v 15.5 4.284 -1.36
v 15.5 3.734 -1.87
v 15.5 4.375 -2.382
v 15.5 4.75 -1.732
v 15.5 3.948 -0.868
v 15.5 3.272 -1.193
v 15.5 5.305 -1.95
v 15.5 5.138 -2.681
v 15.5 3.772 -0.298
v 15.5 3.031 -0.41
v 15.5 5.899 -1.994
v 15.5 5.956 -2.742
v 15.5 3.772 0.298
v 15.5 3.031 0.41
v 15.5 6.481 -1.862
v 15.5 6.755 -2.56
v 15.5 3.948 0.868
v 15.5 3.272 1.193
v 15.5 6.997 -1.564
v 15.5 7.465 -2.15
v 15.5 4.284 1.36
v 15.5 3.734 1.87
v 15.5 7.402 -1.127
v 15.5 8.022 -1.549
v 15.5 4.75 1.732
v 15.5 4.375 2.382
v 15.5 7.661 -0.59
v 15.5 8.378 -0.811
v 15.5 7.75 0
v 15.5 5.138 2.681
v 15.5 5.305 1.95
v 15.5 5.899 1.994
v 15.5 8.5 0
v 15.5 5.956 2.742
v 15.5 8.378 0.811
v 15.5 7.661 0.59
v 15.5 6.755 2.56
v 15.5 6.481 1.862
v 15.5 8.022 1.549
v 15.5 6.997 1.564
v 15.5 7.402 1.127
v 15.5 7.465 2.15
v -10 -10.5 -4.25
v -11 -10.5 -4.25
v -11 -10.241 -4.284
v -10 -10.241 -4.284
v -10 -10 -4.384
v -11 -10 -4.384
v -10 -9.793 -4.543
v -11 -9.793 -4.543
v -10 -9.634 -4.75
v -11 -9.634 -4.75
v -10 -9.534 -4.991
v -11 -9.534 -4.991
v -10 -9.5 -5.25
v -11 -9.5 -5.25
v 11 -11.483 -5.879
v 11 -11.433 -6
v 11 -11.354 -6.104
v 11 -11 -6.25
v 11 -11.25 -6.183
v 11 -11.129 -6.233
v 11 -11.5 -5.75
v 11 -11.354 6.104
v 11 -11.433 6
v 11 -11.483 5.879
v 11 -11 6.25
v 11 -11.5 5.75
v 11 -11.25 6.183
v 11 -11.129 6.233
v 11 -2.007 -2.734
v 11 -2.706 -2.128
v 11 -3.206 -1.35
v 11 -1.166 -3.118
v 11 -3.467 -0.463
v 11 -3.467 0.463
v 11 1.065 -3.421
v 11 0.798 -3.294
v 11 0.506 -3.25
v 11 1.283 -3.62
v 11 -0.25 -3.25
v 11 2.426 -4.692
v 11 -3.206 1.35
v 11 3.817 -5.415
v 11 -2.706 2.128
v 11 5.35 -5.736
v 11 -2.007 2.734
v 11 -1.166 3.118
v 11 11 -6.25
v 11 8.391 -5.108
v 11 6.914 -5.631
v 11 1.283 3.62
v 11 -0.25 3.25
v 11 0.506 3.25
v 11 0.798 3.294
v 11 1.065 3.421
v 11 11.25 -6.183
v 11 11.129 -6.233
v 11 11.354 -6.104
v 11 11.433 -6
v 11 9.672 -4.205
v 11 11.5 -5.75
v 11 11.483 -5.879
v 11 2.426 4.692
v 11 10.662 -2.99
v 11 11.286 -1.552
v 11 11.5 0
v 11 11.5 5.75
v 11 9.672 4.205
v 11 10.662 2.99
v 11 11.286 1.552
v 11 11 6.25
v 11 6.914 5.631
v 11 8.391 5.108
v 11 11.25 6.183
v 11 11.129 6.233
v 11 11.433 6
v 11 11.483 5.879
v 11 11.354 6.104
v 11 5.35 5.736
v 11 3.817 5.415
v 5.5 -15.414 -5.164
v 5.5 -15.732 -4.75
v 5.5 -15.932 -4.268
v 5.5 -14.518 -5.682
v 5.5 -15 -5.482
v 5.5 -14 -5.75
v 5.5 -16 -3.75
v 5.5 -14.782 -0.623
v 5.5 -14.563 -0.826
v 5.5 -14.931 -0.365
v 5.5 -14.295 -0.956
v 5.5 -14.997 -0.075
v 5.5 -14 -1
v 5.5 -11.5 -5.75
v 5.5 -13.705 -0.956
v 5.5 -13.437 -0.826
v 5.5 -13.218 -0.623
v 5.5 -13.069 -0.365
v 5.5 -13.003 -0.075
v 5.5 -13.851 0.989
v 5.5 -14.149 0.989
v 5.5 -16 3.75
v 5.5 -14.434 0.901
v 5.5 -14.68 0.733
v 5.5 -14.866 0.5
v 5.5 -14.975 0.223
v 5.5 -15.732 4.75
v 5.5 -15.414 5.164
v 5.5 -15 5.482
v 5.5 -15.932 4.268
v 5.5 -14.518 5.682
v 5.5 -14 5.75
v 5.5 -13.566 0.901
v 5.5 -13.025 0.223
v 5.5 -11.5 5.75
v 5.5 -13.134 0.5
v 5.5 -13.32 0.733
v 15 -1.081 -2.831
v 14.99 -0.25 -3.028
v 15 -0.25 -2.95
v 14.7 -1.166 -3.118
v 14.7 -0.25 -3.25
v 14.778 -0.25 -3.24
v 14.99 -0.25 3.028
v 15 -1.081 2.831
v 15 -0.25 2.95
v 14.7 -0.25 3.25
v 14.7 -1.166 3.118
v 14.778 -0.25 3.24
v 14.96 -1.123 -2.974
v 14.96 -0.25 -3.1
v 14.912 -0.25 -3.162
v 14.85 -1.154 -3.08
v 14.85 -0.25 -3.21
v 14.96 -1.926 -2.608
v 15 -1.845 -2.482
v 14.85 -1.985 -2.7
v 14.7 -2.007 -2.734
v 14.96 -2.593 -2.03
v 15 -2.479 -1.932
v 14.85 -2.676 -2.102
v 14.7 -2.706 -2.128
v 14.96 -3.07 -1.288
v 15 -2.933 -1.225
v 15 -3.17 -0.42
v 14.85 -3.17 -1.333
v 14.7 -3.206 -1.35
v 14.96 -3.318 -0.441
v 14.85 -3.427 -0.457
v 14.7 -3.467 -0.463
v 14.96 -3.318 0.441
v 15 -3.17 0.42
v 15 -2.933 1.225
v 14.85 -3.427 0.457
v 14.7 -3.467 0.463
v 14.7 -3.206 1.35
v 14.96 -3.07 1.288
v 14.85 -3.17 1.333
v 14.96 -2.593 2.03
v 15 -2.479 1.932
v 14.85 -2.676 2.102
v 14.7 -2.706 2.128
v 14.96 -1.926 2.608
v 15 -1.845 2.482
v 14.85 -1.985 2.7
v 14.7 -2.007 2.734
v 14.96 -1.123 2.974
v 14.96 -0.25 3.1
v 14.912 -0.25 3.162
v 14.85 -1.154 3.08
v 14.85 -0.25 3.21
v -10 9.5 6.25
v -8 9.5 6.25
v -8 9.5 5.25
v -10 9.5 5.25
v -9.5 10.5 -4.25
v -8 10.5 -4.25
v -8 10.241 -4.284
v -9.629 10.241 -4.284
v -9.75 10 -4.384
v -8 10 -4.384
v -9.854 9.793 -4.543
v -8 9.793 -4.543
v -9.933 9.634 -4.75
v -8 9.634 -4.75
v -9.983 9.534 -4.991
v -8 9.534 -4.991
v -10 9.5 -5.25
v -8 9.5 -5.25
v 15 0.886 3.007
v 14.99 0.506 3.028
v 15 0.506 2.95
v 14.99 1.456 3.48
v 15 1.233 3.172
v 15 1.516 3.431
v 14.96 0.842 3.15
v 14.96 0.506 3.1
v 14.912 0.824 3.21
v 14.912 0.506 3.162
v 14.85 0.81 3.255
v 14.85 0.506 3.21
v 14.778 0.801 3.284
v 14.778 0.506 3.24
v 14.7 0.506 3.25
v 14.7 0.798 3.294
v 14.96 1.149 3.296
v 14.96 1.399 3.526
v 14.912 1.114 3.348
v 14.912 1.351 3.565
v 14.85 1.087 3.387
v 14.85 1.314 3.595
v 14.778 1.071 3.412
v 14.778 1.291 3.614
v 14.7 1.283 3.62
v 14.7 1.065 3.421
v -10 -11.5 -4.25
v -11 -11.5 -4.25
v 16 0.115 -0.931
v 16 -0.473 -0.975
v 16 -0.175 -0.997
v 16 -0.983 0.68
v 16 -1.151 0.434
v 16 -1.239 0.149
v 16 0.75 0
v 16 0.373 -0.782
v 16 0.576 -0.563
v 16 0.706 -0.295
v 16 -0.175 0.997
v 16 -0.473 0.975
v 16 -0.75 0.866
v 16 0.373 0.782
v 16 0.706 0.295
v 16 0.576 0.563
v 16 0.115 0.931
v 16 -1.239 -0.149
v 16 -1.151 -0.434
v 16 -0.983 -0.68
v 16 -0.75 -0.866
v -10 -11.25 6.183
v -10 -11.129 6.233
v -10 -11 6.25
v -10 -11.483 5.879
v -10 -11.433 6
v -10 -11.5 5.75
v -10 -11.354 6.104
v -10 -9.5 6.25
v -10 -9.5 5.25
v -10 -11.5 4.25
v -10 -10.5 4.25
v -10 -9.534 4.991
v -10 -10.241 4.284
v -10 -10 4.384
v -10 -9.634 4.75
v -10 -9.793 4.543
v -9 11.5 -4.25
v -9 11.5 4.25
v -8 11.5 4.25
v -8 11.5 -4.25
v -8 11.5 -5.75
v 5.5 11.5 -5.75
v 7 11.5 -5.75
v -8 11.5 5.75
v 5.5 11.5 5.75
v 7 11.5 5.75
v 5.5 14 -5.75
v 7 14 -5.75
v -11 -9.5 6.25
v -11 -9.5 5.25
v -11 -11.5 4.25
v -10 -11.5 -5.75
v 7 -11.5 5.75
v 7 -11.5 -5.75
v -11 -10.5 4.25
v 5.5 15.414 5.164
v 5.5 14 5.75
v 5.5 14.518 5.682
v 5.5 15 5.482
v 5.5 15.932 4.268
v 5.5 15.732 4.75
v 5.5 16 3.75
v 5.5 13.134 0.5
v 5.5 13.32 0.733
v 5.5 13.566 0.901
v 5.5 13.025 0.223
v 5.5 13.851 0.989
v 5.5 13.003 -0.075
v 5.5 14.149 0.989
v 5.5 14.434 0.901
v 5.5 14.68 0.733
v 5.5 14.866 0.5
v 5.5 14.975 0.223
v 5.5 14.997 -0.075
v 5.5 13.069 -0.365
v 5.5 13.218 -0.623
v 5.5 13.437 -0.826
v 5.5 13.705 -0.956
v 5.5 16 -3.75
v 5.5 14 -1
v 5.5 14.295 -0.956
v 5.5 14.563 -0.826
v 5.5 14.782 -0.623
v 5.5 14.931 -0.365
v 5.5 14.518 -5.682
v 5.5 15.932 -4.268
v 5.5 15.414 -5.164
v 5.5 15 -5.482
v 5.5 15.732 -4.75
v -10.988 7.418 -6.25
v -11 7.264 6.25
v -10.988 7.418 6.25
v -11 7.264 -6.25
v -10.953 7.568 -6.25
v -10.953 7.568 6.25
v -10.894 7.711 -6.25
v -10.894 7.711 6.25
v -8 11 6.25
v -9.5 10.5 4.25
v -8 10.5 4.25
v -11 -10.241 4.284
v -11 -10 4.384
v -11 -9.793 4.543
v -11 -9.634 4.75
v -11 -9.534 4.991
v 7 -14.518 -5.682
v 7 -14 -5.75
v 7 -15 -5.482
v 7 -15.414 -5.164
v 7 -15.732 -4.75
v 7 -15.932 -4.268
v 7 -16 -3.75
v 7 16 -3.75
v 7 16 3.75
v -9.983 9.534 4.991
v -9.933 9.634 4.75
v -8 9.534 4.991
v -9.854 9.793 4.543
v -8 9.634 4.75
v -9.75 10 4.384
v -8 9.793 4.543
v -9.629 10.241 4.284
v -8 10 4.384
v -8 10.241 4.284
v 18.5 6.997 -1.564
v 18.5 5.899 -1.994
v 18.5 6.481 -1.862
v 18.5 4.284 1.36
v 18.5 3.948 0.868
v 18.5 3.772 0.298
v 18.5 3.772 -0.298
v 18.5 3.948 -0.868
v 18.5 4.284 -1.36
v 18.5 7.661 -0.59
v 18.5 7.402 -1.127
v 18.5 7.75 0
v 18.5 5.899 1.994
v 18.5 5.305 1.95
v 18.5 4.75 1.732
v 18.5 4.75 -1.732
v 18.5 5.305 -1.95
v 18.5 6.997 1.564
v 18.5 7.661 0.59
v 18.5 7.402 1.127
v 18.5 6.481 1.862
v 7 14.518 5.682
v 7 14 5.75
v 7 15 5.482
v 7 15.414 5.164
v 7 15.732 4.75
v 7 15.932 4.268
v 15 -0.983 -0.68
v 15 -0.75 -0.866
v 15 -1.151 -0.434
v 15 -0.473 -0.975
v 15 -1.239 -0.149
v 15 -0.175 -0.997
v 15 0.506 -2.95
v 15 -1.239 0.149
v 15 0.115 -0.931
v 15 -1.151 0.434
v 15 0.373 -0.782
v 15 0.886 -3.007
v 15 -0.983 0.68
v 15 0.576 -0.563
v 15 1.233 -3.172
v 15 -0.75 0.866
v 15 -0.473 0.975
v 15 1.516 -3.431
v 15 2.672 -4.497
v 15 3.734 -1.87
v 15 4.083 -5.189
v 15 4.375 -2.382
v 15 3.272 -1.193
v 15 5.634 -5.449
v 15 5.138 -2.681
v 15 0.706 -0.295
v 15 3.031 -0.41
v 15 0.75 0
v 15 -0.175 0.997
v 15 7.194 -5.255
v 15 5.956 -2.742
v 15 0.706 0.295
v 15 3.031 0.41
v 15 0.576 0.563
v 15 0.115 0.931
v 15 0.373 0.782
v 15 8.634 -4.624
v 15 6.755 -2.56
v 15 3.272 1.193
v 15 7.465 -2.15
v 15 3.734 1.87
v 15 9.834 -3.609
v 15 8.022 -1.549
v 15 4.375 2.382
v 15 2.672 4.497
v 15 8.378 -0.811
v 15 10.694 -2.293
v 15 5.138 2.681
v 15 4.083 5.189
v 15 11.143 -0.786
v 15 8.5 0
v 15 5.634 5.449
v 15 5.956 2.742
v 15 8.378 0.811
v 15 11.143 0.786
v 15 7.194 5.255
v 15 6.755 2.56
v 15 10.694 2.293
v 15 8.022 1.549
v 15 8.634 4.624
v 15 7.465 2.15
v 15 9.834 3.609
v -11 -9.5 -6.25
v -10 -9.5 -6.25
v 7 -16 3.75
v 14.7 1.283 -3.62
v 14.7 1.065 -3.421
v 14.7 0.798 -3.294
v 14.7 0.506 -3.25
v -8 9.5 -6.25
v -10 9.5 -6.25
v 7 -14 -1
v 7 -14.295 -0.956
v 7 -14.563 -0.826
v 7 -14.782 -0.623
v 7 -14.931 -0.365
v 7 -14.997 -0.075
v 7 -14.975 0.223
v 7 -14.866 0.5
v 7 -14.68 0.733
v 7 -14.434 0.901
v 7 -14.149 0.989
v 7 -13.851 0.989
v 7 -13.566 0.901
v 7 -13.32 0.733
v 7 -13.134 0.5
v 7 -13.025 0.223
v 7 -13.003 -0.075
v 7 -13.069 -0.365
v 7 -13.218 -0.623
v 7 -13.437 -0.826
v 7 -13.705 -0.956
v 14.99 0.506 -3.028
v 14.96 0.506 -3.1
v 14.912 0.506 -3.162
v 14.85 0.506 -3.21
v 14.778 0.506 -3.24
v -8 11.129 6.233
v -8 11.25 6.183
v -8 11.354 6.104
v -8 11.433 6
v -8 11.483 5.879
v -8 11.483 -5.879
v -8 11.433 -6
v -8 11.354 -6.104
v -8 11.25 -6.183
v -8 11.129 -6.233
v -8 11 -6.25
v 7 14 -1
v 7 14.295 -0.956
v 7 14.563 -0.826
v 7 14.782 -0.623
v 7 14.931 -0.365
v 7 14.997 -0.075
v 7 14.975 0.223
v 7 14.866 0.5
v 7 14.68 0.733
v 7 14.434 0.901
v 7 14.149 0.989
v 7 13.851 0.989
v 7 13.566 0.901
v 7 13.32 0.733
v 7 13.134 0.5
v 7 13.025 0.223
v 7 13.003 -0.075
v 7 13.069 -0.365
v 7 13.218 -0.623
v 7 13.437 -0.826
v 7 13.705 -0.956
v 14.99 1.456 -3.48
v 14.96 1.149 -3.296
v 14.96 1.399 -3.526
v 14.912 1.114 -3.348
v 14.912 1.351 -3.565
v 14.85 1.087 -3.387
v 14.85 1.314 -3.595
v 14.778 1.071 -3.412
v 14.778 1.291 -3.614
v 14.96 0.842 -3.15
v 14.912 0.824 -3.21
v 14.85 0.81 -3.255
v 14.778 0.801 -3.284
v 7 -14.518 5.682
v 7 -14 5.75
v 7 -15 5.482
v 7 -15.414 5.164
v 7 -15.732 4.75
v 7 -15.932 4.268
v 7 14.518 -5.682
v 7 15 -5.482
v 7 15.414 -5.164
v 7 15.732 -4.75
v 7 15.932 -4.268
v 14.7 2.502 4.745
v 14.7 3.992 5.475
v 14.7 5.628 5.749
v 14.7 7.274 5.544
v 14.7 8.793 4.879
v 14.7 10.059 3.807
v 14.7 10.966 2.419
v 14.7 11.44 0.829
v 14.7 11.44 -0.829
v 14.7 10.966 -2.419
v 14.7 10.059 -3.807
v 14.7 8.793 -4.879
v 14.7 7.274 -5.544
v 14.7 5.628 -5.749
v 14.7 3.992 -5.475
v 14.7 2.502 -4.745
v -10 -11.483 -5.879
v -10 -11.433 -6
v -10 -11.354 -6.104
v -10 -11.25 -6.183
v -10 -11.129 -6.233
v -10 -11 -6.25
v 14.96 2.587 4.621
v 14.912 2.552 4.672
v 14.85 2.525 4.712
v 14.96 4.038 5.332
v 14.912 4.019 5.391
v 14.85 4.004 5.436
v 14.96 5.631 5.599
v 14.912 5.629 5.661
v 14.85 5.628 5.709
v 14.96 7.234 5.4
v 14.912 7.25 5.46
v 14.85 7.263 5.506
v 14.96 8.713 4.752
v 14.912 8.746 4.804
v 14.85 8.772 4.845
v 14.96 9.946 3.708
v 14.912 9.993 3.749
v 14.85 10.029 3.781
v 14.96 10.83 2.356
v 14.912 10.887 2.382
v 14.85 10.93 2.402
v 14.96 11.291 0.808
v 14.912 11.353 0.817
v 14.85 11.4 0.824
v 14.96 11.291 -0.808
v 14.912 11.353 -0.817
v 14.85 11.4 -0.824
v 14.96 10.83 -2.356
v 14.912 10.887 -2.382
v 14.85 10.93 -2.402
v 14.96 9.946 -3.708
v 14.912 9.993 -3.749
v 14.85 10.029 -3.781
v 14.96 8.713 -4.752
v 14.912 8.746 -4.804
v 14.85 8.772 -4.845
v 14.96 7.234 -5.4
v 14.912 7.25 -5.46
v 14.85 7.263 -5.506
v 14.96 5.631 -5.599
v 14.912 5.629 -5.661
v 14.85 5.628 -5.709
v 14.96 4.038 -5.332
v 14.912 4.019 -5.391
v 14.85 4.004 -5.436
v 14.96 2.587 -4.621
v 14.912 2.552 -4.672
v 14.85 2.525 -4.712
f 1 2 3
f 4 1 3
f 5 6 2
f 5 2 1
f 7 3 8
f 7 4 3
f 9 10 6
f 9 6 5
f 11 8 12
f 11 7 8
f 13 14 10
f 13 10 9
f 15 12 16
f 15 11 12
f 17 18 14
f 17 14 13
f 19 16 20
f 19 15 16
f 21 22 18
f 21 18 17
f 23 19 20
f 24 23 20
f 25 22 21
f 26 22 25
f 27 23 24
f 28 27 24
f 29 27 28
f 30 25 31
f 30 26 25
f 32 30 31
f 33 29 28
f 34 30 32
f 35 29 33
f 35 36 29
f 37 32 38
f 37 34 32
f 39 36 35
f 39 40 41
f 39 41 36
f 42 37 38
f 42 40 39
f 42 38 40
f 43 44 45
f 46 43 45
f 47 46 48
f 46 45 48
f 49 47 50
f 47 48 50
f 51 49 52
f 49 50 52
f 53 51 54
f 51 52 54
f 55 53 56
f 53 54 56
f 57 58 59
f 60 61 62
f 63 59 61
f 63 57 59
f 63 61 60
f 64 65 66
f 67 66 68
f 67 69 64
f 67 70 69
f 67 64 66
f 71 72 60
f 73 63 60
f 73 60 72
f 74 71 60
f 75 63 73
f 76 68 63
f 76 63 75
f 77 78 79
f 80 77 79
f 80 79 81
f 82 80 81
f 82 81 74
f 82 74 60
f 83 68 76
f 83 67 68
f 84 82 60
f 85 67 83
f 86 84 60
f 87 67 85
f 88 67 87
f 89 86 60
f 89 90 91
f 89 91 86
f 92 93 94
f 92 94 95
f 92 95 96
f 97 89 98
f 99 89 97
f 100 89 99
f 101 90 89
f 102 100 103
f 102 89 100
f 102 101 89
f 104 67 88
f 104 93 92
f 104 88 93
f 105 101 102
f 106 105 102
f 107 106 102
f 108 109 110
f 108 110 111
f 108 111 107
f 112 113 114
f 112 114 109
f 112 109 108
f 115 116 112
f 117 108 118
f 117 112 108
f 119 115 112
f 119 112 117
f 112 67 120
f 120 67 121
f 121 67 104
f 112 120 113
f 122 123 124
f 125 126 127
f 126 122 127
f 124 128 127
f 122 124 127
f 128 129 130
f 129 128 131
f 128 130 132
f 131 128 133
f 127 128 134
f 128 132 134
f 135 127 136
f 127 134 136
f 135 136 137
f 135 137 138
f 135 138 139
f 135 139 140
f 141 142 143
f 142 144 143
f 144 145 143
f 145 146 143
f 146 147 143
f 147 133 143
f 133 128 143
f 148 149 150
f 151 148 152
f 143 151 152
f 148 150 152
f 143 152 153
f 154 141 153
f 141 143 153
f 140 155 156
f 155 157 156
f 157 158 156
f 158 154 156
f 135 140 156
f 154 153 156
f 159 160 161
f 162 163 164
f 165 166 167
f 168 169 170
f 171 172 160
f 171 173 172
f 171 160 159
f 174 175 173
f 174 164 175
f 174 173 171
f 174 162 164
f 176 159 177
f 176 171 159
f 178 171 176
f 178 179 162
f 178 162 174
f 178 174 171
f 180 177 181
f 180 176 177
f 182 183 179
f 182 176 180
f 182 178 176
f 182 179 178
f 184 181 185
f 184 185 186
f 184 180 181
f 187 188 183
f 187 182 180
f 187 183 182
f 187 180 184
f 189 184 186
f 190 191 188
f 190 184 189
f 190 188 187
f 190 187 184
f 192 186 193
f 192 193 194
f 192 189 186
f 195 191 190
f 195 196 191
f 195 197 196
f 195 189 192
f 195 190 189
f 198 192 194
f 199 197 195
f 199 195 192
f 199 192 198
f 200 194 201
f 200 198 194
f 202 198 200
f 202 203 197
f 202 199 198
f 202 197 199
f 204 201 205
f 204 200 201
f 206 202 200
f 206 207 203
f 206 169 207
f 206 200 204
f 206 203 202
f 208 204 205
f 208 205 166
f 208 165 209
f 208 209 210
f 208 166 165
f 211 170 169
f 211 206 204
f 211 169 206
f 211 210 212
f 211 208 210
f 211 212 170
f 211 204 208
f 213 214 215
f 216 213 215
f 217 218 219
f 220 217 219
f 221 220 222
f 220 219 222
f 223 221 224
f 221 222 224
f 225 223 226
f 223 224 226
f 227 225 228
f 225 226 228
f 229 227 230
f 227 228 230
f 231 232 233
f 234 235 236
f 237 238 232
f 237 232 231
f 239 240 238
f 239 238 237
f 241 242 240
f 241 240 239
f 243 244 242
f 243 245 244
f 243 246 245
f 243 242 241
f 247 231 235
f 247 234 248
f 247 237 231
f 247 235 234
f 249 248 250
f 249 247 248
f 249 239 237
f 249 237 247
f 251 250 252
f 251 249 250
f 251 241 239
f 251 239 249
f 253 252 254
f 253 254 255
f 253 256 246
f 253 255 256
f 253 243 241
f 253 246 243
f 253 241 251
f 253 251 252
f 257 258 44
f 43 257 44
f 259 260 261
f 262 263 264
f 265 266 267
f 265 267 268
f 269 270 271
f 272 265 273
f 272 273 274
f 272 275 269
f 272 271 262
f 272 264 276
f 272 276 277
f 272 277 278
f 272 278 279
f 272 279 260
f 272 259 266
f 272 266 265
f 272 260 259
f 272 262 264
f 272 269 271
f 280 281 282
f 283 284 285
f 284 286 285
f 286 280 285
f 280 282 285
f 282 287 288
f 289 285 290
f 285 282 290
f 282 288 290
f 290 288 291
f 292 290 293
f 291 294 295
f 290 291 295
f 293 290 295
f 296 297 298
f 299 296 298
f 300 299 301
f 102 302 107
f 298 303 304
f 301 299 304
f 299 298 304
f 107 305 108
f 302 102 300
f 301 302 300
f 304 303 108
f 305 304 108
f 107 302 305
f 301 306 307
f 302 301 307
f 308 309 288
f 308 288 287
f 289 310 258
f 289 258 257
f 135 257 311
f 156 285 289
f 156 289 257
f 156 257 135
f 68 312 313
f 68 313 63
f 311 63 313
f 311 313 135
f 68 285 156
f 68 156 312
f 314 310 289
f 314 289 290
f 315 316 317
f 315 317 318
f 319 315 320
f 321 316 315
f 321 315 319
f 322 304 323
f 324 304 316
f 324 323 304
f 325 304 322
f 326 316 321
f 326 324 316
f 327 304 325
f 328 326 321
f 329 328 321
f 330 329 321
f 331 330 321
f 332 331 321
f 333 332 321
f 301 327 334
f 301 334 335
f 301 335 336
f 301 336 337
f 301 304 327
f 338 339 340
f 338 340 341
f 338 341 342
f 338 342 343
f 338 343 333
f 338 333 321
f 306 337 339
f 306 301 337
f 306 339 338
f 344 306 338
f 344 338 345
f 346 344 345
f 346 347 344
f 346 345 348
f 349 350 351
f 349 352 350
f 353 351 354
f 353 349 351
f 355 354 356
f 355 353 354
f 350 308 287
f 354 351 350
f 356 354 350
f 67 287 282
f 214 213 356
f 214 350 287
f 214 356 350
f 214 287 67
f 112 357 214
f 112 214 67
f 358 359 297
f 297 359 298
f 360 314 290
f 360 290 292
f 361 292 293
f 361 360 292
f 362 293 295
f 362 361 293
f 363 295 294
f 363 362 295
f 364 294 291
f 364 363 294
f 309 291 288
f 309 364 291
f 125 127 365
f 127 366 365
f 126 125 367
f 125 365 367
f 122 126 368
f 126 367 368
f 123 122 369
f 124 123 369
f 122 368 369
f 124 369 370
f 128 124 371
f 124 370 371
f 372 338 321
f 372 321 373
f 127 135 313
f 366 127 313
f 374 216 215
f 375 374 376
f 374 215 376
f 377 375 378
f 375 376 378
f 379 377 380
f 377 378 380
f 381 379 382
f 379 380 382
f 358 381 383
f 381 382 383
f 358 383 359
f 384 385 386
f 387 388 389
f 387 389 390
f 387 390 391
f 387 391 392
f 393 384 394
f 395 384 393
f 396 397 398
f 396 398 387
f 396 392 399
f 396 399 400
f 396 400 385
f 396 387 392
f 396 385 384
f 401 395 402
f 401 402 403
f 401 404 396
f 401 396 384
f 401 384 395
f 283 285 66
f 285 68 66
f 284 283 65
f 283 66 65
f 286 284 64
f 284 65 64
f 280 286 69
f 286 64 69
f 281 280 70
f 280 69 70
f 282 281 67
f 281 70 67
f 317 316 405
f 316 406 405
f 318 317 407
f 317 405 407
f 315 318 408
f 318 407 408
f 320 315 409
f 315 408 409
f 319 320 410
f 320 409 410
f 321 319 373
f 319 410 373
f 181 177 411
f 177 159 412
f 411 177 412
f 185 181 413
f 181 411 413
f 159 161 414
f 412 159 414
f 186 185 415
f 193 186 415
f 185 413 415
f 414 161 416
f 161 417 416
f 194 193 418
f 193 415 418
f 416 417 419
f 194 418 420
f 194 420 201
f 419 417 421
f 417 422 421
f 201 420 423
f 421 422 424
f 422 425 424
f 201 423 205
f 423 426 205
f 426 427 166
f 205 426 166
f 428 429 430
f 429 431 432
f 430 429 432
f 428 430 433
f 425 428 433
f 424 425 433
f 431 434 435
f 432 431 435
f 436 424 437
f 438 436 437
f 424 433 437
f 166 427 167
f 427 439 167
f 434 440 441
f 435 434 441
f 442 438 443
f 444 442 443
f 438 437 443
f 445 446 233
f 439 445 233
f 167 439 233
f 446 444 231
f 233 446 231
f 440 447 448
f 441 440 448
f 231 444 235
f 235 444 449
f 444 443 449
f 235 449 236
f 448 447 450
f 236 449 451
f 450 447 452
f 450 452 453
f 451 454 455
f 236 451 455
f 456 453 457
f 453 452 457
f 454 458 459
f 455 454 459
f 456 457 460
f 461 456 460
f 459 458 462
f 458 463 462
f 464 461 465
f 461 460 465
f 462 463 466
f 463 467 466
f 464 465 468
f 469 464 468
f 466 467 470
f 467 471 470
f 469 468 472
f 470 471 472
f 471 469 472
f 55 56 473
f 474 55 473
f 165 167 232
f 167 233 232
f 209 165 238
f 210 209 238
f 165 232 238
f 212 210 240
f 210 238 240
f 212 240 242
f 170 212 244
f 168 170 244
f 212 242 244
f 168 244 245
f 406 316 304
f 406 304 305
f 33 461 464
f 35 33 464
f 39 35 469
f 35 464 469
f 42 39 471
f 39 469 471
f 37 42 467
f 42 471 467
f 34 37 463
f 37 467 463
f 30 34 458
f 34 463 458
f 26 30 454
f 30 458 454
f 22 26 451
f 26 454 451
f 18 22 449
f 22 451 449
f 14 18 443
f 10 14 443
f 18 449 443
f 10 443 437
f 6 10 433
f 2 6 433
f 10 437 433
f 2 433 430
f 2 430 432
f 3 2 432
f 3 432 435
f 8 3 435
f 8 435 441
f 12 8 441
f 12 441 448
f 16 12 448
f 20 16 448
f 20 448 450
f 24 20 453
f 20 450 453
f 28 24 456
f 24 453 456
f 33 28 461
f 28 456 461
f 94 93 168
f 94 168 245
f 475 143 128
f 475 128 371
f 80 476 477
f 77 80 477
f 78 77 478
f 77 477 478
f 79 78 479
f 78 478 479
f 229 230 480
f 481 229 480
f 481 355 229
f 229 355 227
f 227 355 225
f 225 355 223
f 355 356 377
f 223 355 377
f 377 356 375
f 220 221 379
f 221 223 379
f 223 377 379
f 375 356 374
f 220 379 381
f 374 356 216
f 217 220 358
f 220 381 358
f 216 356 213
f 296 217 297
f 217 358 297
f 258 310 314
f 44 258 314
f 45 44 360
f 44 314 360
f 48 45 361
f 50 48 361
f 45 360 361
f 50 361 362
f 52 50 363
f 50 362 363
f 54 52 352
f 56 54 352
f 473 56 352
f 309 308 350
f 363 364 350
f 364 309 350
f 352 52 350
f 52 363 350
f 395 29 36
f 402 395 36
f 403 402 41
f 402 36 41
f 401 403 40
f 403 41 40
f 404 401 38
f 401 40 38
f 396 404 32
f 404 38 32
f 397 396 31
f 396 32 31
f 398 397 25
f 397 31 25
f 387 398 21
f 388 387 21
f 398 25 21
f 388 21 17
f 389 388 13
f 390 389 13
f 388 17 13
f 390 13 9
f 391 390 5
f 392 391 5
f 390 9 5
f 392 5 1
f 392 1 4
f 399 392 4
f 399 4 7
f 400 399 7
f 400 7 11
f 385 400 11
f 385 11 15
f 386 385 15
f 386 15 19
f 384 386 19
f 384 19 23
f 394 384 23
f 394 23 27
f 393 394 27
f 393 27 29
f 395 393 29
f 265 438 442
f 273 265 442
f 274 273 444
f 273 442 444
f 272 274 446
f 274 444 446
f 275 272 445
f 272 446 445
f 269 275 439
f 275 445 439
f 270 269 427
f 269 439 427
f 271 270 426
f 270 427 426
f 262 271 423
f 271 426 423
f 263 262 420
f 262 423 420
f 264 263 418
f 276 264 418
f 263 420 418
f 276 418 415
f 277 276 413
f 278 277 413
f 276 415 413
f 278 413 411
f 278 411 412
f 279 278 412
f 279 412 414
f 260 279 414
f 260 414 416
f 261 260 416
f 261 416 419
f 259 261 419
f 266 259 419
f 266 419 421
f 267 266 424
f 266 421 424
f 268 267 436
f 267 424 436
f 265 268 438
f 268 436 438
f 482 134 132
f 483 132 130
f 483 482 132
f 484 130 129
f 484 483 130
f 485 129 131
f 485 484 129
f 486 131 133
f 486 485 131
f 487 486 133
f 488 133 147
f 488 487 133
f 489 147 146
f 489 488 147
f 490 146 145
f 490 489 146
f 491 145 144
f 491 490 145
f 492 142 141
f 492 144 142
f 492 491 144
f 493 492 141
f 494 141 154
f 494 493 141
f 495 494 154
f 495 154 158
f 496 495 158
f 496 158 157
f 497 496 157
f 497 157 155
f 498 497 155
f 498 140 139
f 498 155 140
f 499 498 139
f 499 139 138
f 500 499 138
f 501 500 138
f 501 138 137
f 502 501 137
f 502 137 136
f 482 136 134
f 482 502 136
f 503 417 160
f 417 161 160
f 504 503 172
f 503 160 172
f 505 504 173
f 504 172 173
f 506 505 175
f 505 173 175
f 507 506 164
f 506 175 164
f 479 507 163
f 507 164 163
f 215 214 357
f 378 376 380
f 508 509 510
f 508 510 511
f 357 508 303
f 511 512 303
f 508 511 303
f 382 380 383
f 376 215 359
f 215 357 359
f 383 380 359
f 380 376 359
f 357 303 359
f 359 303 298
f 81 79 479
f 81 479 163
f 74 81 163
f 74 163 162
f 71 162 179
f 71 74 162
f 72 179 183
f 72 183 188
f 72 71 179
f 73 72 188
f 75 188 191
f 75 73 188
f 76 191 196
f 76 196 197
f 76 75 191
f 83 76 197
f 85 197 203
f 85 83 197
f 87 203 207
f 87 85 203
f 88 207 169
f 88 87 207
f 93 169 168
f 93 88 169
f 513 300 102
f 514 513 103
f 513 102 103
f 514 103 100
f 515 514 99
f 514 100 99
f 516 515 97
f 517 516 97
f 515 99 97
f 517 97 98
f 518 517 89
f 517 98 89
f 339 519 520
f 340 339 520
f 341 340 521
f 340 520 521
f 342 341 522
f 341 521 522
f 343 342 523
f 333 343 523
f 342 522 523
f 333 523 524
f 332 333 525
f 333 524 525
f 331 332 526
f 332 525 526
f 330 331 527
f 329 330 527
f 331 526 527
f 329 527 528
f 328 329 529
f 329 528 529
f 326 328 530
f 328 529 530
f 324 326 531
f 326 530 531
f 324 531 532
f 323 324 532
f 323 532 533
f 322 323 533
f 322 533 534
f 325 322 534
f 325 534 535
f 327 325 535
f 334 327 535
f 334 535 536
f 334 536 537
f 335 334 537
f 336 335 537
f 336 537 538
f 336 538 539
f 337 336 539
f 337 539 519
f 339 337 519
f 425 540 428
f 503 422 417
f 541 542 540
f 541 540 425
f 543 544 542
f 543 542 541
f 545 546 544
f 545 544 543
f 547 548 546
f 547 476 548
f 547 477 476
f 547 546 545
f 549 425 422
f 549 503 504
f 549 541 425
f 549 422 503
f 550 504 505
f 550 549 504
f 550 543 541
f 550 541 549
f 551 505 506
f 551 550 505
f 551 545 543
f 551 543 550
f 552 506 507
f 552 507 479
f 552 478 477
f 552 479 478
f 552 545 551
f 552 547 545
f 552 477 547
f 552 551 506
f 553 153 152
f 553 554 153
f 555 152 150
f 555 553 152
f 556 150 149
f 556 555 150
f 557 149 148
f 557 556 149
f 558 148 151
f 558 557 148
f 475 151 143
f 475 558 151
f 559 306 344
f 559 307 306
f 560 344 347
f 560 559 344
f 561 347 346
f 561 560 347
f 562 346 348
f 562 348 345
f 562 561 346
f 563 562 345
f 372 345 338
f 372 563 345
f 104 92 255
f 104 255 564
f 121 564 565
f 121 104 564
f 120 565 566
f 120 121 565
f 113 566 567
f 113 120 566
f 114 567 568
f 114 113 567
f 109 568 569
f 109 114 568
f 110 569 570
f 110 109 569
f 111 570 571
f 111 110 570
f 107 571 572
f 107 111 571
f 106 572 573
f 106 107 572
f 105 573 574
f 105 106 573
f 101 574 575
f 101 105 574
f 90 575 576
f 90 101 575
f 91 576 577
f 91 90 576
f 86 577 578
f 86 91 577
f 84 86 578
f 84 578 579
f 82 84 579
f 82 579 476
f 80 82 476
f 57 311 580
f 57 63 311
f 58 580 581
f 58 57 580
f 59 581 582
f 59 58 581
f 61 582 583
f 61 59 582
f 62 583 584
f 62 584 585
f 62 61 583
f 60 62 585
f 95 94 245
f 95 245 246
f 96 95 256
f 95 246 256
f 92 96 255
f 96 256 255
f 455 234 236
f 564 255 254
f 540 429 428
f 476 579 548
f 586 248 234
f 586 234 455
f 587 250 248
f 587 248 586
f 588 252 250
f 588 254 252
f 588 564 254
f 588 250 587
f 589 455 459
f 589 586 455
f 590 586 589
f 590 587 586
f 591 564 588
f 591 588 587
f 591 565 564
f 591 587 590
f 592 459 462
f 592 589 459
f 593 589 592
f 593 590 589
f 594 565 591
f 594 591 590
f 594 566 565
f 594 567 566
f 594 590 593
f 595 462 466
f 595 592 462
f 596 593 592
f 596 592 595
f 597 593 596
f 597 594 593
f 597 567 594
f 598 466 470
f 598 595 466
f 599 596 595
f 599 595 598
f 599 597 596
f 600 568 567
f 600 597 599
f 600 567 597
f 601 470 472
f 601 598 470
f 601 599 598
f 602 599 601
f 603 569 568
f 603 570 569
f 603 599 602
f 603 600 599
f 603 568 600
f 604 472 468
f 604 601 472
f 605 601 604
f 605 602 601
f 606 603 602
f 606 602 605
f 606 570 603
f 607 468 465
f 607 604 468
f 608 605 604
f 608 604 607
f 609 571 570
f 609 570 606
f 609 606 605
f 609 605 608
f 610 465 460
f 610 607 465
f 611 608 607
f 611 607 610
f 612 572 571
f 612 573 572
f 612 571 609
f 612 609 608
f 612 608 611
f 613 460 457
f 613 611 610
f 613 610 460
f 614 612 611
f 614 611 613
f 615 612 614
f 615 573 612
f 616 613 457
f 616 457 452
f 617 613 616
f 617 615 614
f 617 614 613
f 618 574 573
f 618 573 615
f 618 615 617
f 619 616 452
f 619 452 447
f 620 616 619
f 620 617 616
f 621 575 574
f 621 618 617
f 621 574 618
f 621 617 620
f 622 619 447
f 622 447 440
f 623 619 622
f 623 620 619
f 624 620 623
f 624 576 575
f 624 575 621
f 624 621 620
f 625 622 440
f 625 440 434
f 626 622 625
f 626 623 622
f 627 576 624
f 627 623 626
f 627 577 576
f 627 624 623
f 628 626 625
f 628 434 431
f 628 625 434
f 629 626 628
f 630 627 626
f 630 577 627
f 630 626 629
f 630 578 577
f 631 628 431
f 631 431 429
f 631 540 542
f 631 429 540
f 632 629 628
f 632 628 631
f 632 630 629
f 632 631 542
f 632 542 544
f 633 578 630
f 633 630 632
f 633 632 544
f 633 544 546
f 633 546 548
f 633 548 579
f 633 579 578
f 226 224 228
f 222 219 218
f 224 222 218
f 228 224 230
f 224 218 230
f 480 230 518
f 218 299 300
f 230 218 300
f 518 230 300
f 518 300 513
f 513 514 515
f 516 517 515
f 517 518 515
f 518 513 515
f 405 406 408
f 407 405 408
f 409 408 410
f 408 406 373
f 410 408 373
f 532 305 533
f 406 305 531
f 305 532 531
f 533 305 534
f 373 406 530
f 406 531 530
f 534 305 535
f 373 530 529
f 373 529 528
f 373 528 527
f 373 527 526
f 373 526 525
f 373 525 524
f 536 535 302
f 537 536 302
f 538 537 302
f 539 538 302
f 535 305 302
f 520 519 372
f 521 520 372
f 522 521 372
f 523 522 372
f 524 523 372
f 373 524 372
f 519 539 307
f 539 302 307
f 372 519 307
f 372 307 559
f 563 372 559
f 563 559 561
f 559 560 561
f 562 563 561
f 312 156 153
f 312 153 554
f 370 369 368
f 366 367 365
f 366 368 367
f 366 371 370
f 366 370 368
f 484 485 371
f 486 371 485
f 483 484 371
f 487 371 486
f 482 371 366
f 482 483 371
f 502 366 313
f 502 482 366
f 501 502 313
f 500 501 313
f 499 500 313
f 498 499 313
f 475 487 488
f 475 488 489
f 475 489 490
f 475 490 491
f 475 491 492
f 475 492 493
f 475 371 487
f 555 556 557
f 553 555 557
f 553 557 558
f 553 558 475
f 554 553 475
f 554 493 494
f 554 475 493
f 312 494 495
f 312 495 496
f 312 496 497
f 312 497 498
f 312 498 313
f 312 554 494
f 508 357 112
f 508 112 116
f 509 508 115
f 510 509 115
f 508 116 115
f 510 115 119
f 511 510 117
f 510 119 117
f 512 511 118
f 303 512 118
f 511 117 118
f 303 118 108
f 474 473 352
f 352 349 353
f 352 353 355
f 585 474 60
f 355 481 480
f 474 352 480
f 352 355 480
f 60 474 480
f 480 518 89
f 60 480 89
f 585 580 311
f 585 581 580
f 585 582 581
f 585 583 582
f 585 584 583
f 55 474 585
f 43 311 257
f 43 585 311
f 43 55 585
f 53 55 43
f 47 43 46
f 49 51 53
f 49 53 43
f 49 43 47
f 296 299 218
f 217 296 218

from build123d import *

# Parameters (mm, degrees)
SKETCH1_W           = 22
SKETCH1_H           = 23
EXTRUDE1_DEPTH      = 6.25
EXTRUDE2_DEPTH      = 4
SKETCH3_R           = 2
EXTRUDE3_DEPTH      = 3.5
EXTRUDE4_DEPTH      = 26.11473671
FILLET1_R           = 1
SKETCH5_R           = 1
EXTRUDE5_DEPTH      = 1
SKETCH6_R           = 2.75
EXTRUDE6_DEPTH      = 0.5
EXTRUDE7_DEPTH      = 1
EXTRUDE8_DEPTH      = 33.273247435
EXTRUDE8_DEPTH_BACK = 1
EXTRUDE8_START      = -2
SKETCH8_W           = 1.5
SKETCH8_H           = 4.5
EXTRUDE9_DEPTH      = 5.75
FILLET3_R           = 0.3
FILLET4_R           = 0.5
FILLET5_R           = 2
SKETCH9_R           = 1
EXTRUDE10_DEPTH     = 11.5


with BuildPart() as part:
    # Sketch1 → Extrude1 (new, symmetric)
    with BuildSketch(Plane.XY):
        Rectangle(SKETCH1_W, SKETCH1_H)
    extrude(amount=EXTRUDE1_DEPTH, both=True)

    # Sketch2 → Extrude2 (add)
    with BuildSketch(Plane(origin=(11, 0, 0), x_dir=(0, 0, -1), z_dir=(1, 0, 0))):
        with BuildLine():
            Line((-3.25, -0.25), (-3.25, 1.00658351))
            ThreePointArc((-3.25, 1.00658351), (0, 11.5), (3.25, 1.00658351))
            Line((3.25, 1.00658351), (3.25, -0.25))
            ThreePointArc((3.25, -0.25), (0, -3.5), (-3.25, -0.25))
        make_face()
    extrude(amount=EXTRUDE2_DEPTH)

    # Sketch3 → Extrude3 (add)
    with BuildSketch(Plane(origin=(15, 0, 0), x_dir=(0, 0, -1), z_dir=(1, 0, 0))):
        with Locations(Location((0, 5.75, 0), (0, 0, 90))):
            Circle(SKETCH3_R)
    extrude(amount=EXTRUDE3_DEPTH)

    # Sketch4 → Extrude4 (cut, through all)
    with BuildSketch(Plane.XY.offset(6.25)):
        Polygon((-9, 11.5), (-11, 11.5), (-11, 7.5), align=None)
    extrude(amount=-EXTRUDE4_DEPTH, mode=Mode.SUBTRACT)

    # Fillet1
    fillet1_edges = [part.edges().sort_by_distance(p)[0] for p in [
        (13, 1.00658351, -3.25),
        (13, 1.00658351, 3.25),
        (-11, 7.5, 0),
    ]]
    fillet(fillet1_edges, radius=FILLET1_R)

    # Sketch5 → Extrude5 (add)
    with BuildSketch(Plane(origin=(15, 0, 0), x_dir=(0, 0, -1), z_dir=(1, 0, 0))):
        with Locations(Location((0, -0.25, 0), (0, 0, 90))):
            Circle(SKETCH5_R)
    extrude(amount=EXTRUDE5_DEPTH)

    # Sketch6 → Extrude6 (add)
    with BuildSketch(Plane(origin=(15, 0, 0), x_dir=(0, 0, -1), z_dir=(1, 0, 0))):
        with Locations(Location((0, 5.75, 0), (0, 0, 90))):
            Circle(SKETCH6_R)
    extrude(amount=EXTRUDE6_DEPTH)

    # Sketch7 → Extrude7 (cut)
    with BuildSketch(Plane.ZY.offset(11)):
        with BuildLine():
            Line((-5.25, -9.5), (-6.25, -9.5))
            Line((-6.25, -9.5), (-6.25, -11.5))
            Line((-6.25, -11.5), (-4.25, -11.5))
            Line((-4.25, -11.5), (-4.25, -10.5))
            ThreePointArc((-4.25, -10.5), (-4.542893219, -9.792893219), (-5.25, -9.5))
        make_face()
        with BuildLine():
            Line((6.25, -11.5), (4.25, -11.5))
            Line((4.25, -11.5), (4.25, -10.5))
            ThreePointArc((4.25, -10.5), (4.542893219, -9.792893219), (5.25, -9.5))
            Line((5.25, -9.5), (6.25, -9.5))
            Line((6.25, -9.5), (6.25, -11.5))
        make_face()
        with BuildLine():
            Line((5.25, 9.5), (6.25, 9.5))
            Line((6.25, 9.5), (6.25, 11.5))
            Line((6.25, 11.5), (4.25, 11.5))
            Line((4.25, 11.5), (4.25, 10.5))
            ThreePointArc((4.25, 10.5), (4.542893219, 9.792893219), (5.25, 9.5))
        make_face()
        with BuildLine():
            Line((-6.25, 11.5), (-4.25, 11.5))
            Line((-4.25, 11.5), (-4.25, 10.5))
            ThreePointArc((-4.25, 10.5), (-4.542893219, 9.792893219), (-5.25, 9.5))
            Line((-5.25, 9.5), (-6.25, 9.5))
            Line((-6.25, 9.5), (-6.25, 11.5))
        make_face()
    extrude(amount=-EXTRUDE7_DEPTH, mode=Mode.SUBTRACT)

    # Sketch → Extrude8 (cut, two sides: drawn at the far end of the back side and taken through both)
    with BuildSketch(Plane.ZY.offset(11).offset(EXTRUDE8_START - EXTRUDE8_DEPTH_BACK)):
        with BuildLine():
            ThreePointArc((-4.25, 10.5), (-4.542893219, 9.792893219), (-5.25, 9.5))
            Line((-5.25, 9.5), (-6.25, 9.5))
            Line((-6.25, 9.5), (-6.25, 11.5))
            Line((-6.25, 11.5), (-4.25, 11.5))
            Line((-4.25, 11.5), (-4.25, 10.5))
        make_face()
        with BuildLine():
            Line((4.25, 10.5), (4.25, 11.5))
            Line((4.25, 11.5), (6.25, 11.5))
            Line((6.25, 11.5), (6.25, 9.5))
            Line((6.25, 9.5), (5.25, 9.5))
            ThreePointArc((5.25, 9.5), (4.542893219, 9.792893219), (4.25, 10.5))
        make_face()
    extrude(amount=EXTRUDE8_DEPTH + EXTRUDE8_DEPTH_BACK, mode=Mode.SUBTRACT)

    # Sketch8 → Extrude9 (add, symmetric)
    with BuildSketch(Plane.XY):
        with Locations((6.25, 13.75)):
            Rectangle(SKETCH8_W, SKETCH8_H)
        with Locations((6.25, -13.75)):
            Rectangle(SKETCH8_W, SKETCH8_H)
    extrude(amount=EXTRUDE9_DEPTH, both=True)

    # Fillet3
    fillet3_edges = [part.edges().sort_by_distance(p)[0] for p in [
        (15, -3.5, 0),
        (15, 0.12797788, -3.25),
        (15, 11.5, 0),
        (15, 0.12797788, 3.25),
        (15, 0.936287242, -3.347329066),
        (15, 0.936287242, 3.347329066),
    ]]
    fillet(fillet3_edges, radius=FILLET3_R)

    # Fillet4
    fillet4_edges = [part.edges().sort_by_distance(p)[0] for p in [
        (1.5, 11.5, -6.25),
        (1.5, 11.5, 6.25),
        (0.5, -11.5, -6.25),
        (0.5, -11.5, 6.25),
    ]]
    fillet(fillet4_edges, radius=FILLET4_R - 0.0001)  # a hair under: the kernel refuses the full size

    # Fillet5
    fillet5_edges = [part.edges().sort_by_distance(p)[0] for p in [
        (6.25, 16, -5.75),
        (6.25, 16, 5.75),
        (6.25, -16, -5.75),
        (6.25, -16, 5.75),
    ]]
    fillet(fillet5_edges, radius=FILLET5_R)

    # Sketch9 → Extrude10 (cut)
    with BuildSketch(Plane(origin=(7, 0, 0), x_dir=(0, 0, -1), z_dir=(1, 0, 0))):
        with Locations((0, 14)):
            Circle(SKETCH9_R)
    extrude10 = extrude(amount=-EXTRUDE10_DEPTH, mode=Mode.SUBTRACT)

    # Mirror1: Extrude10 across plane
    add(extrude10.mirror(Plane.ZX), mode=Mode.SUBTRACT)


solid = part.part
